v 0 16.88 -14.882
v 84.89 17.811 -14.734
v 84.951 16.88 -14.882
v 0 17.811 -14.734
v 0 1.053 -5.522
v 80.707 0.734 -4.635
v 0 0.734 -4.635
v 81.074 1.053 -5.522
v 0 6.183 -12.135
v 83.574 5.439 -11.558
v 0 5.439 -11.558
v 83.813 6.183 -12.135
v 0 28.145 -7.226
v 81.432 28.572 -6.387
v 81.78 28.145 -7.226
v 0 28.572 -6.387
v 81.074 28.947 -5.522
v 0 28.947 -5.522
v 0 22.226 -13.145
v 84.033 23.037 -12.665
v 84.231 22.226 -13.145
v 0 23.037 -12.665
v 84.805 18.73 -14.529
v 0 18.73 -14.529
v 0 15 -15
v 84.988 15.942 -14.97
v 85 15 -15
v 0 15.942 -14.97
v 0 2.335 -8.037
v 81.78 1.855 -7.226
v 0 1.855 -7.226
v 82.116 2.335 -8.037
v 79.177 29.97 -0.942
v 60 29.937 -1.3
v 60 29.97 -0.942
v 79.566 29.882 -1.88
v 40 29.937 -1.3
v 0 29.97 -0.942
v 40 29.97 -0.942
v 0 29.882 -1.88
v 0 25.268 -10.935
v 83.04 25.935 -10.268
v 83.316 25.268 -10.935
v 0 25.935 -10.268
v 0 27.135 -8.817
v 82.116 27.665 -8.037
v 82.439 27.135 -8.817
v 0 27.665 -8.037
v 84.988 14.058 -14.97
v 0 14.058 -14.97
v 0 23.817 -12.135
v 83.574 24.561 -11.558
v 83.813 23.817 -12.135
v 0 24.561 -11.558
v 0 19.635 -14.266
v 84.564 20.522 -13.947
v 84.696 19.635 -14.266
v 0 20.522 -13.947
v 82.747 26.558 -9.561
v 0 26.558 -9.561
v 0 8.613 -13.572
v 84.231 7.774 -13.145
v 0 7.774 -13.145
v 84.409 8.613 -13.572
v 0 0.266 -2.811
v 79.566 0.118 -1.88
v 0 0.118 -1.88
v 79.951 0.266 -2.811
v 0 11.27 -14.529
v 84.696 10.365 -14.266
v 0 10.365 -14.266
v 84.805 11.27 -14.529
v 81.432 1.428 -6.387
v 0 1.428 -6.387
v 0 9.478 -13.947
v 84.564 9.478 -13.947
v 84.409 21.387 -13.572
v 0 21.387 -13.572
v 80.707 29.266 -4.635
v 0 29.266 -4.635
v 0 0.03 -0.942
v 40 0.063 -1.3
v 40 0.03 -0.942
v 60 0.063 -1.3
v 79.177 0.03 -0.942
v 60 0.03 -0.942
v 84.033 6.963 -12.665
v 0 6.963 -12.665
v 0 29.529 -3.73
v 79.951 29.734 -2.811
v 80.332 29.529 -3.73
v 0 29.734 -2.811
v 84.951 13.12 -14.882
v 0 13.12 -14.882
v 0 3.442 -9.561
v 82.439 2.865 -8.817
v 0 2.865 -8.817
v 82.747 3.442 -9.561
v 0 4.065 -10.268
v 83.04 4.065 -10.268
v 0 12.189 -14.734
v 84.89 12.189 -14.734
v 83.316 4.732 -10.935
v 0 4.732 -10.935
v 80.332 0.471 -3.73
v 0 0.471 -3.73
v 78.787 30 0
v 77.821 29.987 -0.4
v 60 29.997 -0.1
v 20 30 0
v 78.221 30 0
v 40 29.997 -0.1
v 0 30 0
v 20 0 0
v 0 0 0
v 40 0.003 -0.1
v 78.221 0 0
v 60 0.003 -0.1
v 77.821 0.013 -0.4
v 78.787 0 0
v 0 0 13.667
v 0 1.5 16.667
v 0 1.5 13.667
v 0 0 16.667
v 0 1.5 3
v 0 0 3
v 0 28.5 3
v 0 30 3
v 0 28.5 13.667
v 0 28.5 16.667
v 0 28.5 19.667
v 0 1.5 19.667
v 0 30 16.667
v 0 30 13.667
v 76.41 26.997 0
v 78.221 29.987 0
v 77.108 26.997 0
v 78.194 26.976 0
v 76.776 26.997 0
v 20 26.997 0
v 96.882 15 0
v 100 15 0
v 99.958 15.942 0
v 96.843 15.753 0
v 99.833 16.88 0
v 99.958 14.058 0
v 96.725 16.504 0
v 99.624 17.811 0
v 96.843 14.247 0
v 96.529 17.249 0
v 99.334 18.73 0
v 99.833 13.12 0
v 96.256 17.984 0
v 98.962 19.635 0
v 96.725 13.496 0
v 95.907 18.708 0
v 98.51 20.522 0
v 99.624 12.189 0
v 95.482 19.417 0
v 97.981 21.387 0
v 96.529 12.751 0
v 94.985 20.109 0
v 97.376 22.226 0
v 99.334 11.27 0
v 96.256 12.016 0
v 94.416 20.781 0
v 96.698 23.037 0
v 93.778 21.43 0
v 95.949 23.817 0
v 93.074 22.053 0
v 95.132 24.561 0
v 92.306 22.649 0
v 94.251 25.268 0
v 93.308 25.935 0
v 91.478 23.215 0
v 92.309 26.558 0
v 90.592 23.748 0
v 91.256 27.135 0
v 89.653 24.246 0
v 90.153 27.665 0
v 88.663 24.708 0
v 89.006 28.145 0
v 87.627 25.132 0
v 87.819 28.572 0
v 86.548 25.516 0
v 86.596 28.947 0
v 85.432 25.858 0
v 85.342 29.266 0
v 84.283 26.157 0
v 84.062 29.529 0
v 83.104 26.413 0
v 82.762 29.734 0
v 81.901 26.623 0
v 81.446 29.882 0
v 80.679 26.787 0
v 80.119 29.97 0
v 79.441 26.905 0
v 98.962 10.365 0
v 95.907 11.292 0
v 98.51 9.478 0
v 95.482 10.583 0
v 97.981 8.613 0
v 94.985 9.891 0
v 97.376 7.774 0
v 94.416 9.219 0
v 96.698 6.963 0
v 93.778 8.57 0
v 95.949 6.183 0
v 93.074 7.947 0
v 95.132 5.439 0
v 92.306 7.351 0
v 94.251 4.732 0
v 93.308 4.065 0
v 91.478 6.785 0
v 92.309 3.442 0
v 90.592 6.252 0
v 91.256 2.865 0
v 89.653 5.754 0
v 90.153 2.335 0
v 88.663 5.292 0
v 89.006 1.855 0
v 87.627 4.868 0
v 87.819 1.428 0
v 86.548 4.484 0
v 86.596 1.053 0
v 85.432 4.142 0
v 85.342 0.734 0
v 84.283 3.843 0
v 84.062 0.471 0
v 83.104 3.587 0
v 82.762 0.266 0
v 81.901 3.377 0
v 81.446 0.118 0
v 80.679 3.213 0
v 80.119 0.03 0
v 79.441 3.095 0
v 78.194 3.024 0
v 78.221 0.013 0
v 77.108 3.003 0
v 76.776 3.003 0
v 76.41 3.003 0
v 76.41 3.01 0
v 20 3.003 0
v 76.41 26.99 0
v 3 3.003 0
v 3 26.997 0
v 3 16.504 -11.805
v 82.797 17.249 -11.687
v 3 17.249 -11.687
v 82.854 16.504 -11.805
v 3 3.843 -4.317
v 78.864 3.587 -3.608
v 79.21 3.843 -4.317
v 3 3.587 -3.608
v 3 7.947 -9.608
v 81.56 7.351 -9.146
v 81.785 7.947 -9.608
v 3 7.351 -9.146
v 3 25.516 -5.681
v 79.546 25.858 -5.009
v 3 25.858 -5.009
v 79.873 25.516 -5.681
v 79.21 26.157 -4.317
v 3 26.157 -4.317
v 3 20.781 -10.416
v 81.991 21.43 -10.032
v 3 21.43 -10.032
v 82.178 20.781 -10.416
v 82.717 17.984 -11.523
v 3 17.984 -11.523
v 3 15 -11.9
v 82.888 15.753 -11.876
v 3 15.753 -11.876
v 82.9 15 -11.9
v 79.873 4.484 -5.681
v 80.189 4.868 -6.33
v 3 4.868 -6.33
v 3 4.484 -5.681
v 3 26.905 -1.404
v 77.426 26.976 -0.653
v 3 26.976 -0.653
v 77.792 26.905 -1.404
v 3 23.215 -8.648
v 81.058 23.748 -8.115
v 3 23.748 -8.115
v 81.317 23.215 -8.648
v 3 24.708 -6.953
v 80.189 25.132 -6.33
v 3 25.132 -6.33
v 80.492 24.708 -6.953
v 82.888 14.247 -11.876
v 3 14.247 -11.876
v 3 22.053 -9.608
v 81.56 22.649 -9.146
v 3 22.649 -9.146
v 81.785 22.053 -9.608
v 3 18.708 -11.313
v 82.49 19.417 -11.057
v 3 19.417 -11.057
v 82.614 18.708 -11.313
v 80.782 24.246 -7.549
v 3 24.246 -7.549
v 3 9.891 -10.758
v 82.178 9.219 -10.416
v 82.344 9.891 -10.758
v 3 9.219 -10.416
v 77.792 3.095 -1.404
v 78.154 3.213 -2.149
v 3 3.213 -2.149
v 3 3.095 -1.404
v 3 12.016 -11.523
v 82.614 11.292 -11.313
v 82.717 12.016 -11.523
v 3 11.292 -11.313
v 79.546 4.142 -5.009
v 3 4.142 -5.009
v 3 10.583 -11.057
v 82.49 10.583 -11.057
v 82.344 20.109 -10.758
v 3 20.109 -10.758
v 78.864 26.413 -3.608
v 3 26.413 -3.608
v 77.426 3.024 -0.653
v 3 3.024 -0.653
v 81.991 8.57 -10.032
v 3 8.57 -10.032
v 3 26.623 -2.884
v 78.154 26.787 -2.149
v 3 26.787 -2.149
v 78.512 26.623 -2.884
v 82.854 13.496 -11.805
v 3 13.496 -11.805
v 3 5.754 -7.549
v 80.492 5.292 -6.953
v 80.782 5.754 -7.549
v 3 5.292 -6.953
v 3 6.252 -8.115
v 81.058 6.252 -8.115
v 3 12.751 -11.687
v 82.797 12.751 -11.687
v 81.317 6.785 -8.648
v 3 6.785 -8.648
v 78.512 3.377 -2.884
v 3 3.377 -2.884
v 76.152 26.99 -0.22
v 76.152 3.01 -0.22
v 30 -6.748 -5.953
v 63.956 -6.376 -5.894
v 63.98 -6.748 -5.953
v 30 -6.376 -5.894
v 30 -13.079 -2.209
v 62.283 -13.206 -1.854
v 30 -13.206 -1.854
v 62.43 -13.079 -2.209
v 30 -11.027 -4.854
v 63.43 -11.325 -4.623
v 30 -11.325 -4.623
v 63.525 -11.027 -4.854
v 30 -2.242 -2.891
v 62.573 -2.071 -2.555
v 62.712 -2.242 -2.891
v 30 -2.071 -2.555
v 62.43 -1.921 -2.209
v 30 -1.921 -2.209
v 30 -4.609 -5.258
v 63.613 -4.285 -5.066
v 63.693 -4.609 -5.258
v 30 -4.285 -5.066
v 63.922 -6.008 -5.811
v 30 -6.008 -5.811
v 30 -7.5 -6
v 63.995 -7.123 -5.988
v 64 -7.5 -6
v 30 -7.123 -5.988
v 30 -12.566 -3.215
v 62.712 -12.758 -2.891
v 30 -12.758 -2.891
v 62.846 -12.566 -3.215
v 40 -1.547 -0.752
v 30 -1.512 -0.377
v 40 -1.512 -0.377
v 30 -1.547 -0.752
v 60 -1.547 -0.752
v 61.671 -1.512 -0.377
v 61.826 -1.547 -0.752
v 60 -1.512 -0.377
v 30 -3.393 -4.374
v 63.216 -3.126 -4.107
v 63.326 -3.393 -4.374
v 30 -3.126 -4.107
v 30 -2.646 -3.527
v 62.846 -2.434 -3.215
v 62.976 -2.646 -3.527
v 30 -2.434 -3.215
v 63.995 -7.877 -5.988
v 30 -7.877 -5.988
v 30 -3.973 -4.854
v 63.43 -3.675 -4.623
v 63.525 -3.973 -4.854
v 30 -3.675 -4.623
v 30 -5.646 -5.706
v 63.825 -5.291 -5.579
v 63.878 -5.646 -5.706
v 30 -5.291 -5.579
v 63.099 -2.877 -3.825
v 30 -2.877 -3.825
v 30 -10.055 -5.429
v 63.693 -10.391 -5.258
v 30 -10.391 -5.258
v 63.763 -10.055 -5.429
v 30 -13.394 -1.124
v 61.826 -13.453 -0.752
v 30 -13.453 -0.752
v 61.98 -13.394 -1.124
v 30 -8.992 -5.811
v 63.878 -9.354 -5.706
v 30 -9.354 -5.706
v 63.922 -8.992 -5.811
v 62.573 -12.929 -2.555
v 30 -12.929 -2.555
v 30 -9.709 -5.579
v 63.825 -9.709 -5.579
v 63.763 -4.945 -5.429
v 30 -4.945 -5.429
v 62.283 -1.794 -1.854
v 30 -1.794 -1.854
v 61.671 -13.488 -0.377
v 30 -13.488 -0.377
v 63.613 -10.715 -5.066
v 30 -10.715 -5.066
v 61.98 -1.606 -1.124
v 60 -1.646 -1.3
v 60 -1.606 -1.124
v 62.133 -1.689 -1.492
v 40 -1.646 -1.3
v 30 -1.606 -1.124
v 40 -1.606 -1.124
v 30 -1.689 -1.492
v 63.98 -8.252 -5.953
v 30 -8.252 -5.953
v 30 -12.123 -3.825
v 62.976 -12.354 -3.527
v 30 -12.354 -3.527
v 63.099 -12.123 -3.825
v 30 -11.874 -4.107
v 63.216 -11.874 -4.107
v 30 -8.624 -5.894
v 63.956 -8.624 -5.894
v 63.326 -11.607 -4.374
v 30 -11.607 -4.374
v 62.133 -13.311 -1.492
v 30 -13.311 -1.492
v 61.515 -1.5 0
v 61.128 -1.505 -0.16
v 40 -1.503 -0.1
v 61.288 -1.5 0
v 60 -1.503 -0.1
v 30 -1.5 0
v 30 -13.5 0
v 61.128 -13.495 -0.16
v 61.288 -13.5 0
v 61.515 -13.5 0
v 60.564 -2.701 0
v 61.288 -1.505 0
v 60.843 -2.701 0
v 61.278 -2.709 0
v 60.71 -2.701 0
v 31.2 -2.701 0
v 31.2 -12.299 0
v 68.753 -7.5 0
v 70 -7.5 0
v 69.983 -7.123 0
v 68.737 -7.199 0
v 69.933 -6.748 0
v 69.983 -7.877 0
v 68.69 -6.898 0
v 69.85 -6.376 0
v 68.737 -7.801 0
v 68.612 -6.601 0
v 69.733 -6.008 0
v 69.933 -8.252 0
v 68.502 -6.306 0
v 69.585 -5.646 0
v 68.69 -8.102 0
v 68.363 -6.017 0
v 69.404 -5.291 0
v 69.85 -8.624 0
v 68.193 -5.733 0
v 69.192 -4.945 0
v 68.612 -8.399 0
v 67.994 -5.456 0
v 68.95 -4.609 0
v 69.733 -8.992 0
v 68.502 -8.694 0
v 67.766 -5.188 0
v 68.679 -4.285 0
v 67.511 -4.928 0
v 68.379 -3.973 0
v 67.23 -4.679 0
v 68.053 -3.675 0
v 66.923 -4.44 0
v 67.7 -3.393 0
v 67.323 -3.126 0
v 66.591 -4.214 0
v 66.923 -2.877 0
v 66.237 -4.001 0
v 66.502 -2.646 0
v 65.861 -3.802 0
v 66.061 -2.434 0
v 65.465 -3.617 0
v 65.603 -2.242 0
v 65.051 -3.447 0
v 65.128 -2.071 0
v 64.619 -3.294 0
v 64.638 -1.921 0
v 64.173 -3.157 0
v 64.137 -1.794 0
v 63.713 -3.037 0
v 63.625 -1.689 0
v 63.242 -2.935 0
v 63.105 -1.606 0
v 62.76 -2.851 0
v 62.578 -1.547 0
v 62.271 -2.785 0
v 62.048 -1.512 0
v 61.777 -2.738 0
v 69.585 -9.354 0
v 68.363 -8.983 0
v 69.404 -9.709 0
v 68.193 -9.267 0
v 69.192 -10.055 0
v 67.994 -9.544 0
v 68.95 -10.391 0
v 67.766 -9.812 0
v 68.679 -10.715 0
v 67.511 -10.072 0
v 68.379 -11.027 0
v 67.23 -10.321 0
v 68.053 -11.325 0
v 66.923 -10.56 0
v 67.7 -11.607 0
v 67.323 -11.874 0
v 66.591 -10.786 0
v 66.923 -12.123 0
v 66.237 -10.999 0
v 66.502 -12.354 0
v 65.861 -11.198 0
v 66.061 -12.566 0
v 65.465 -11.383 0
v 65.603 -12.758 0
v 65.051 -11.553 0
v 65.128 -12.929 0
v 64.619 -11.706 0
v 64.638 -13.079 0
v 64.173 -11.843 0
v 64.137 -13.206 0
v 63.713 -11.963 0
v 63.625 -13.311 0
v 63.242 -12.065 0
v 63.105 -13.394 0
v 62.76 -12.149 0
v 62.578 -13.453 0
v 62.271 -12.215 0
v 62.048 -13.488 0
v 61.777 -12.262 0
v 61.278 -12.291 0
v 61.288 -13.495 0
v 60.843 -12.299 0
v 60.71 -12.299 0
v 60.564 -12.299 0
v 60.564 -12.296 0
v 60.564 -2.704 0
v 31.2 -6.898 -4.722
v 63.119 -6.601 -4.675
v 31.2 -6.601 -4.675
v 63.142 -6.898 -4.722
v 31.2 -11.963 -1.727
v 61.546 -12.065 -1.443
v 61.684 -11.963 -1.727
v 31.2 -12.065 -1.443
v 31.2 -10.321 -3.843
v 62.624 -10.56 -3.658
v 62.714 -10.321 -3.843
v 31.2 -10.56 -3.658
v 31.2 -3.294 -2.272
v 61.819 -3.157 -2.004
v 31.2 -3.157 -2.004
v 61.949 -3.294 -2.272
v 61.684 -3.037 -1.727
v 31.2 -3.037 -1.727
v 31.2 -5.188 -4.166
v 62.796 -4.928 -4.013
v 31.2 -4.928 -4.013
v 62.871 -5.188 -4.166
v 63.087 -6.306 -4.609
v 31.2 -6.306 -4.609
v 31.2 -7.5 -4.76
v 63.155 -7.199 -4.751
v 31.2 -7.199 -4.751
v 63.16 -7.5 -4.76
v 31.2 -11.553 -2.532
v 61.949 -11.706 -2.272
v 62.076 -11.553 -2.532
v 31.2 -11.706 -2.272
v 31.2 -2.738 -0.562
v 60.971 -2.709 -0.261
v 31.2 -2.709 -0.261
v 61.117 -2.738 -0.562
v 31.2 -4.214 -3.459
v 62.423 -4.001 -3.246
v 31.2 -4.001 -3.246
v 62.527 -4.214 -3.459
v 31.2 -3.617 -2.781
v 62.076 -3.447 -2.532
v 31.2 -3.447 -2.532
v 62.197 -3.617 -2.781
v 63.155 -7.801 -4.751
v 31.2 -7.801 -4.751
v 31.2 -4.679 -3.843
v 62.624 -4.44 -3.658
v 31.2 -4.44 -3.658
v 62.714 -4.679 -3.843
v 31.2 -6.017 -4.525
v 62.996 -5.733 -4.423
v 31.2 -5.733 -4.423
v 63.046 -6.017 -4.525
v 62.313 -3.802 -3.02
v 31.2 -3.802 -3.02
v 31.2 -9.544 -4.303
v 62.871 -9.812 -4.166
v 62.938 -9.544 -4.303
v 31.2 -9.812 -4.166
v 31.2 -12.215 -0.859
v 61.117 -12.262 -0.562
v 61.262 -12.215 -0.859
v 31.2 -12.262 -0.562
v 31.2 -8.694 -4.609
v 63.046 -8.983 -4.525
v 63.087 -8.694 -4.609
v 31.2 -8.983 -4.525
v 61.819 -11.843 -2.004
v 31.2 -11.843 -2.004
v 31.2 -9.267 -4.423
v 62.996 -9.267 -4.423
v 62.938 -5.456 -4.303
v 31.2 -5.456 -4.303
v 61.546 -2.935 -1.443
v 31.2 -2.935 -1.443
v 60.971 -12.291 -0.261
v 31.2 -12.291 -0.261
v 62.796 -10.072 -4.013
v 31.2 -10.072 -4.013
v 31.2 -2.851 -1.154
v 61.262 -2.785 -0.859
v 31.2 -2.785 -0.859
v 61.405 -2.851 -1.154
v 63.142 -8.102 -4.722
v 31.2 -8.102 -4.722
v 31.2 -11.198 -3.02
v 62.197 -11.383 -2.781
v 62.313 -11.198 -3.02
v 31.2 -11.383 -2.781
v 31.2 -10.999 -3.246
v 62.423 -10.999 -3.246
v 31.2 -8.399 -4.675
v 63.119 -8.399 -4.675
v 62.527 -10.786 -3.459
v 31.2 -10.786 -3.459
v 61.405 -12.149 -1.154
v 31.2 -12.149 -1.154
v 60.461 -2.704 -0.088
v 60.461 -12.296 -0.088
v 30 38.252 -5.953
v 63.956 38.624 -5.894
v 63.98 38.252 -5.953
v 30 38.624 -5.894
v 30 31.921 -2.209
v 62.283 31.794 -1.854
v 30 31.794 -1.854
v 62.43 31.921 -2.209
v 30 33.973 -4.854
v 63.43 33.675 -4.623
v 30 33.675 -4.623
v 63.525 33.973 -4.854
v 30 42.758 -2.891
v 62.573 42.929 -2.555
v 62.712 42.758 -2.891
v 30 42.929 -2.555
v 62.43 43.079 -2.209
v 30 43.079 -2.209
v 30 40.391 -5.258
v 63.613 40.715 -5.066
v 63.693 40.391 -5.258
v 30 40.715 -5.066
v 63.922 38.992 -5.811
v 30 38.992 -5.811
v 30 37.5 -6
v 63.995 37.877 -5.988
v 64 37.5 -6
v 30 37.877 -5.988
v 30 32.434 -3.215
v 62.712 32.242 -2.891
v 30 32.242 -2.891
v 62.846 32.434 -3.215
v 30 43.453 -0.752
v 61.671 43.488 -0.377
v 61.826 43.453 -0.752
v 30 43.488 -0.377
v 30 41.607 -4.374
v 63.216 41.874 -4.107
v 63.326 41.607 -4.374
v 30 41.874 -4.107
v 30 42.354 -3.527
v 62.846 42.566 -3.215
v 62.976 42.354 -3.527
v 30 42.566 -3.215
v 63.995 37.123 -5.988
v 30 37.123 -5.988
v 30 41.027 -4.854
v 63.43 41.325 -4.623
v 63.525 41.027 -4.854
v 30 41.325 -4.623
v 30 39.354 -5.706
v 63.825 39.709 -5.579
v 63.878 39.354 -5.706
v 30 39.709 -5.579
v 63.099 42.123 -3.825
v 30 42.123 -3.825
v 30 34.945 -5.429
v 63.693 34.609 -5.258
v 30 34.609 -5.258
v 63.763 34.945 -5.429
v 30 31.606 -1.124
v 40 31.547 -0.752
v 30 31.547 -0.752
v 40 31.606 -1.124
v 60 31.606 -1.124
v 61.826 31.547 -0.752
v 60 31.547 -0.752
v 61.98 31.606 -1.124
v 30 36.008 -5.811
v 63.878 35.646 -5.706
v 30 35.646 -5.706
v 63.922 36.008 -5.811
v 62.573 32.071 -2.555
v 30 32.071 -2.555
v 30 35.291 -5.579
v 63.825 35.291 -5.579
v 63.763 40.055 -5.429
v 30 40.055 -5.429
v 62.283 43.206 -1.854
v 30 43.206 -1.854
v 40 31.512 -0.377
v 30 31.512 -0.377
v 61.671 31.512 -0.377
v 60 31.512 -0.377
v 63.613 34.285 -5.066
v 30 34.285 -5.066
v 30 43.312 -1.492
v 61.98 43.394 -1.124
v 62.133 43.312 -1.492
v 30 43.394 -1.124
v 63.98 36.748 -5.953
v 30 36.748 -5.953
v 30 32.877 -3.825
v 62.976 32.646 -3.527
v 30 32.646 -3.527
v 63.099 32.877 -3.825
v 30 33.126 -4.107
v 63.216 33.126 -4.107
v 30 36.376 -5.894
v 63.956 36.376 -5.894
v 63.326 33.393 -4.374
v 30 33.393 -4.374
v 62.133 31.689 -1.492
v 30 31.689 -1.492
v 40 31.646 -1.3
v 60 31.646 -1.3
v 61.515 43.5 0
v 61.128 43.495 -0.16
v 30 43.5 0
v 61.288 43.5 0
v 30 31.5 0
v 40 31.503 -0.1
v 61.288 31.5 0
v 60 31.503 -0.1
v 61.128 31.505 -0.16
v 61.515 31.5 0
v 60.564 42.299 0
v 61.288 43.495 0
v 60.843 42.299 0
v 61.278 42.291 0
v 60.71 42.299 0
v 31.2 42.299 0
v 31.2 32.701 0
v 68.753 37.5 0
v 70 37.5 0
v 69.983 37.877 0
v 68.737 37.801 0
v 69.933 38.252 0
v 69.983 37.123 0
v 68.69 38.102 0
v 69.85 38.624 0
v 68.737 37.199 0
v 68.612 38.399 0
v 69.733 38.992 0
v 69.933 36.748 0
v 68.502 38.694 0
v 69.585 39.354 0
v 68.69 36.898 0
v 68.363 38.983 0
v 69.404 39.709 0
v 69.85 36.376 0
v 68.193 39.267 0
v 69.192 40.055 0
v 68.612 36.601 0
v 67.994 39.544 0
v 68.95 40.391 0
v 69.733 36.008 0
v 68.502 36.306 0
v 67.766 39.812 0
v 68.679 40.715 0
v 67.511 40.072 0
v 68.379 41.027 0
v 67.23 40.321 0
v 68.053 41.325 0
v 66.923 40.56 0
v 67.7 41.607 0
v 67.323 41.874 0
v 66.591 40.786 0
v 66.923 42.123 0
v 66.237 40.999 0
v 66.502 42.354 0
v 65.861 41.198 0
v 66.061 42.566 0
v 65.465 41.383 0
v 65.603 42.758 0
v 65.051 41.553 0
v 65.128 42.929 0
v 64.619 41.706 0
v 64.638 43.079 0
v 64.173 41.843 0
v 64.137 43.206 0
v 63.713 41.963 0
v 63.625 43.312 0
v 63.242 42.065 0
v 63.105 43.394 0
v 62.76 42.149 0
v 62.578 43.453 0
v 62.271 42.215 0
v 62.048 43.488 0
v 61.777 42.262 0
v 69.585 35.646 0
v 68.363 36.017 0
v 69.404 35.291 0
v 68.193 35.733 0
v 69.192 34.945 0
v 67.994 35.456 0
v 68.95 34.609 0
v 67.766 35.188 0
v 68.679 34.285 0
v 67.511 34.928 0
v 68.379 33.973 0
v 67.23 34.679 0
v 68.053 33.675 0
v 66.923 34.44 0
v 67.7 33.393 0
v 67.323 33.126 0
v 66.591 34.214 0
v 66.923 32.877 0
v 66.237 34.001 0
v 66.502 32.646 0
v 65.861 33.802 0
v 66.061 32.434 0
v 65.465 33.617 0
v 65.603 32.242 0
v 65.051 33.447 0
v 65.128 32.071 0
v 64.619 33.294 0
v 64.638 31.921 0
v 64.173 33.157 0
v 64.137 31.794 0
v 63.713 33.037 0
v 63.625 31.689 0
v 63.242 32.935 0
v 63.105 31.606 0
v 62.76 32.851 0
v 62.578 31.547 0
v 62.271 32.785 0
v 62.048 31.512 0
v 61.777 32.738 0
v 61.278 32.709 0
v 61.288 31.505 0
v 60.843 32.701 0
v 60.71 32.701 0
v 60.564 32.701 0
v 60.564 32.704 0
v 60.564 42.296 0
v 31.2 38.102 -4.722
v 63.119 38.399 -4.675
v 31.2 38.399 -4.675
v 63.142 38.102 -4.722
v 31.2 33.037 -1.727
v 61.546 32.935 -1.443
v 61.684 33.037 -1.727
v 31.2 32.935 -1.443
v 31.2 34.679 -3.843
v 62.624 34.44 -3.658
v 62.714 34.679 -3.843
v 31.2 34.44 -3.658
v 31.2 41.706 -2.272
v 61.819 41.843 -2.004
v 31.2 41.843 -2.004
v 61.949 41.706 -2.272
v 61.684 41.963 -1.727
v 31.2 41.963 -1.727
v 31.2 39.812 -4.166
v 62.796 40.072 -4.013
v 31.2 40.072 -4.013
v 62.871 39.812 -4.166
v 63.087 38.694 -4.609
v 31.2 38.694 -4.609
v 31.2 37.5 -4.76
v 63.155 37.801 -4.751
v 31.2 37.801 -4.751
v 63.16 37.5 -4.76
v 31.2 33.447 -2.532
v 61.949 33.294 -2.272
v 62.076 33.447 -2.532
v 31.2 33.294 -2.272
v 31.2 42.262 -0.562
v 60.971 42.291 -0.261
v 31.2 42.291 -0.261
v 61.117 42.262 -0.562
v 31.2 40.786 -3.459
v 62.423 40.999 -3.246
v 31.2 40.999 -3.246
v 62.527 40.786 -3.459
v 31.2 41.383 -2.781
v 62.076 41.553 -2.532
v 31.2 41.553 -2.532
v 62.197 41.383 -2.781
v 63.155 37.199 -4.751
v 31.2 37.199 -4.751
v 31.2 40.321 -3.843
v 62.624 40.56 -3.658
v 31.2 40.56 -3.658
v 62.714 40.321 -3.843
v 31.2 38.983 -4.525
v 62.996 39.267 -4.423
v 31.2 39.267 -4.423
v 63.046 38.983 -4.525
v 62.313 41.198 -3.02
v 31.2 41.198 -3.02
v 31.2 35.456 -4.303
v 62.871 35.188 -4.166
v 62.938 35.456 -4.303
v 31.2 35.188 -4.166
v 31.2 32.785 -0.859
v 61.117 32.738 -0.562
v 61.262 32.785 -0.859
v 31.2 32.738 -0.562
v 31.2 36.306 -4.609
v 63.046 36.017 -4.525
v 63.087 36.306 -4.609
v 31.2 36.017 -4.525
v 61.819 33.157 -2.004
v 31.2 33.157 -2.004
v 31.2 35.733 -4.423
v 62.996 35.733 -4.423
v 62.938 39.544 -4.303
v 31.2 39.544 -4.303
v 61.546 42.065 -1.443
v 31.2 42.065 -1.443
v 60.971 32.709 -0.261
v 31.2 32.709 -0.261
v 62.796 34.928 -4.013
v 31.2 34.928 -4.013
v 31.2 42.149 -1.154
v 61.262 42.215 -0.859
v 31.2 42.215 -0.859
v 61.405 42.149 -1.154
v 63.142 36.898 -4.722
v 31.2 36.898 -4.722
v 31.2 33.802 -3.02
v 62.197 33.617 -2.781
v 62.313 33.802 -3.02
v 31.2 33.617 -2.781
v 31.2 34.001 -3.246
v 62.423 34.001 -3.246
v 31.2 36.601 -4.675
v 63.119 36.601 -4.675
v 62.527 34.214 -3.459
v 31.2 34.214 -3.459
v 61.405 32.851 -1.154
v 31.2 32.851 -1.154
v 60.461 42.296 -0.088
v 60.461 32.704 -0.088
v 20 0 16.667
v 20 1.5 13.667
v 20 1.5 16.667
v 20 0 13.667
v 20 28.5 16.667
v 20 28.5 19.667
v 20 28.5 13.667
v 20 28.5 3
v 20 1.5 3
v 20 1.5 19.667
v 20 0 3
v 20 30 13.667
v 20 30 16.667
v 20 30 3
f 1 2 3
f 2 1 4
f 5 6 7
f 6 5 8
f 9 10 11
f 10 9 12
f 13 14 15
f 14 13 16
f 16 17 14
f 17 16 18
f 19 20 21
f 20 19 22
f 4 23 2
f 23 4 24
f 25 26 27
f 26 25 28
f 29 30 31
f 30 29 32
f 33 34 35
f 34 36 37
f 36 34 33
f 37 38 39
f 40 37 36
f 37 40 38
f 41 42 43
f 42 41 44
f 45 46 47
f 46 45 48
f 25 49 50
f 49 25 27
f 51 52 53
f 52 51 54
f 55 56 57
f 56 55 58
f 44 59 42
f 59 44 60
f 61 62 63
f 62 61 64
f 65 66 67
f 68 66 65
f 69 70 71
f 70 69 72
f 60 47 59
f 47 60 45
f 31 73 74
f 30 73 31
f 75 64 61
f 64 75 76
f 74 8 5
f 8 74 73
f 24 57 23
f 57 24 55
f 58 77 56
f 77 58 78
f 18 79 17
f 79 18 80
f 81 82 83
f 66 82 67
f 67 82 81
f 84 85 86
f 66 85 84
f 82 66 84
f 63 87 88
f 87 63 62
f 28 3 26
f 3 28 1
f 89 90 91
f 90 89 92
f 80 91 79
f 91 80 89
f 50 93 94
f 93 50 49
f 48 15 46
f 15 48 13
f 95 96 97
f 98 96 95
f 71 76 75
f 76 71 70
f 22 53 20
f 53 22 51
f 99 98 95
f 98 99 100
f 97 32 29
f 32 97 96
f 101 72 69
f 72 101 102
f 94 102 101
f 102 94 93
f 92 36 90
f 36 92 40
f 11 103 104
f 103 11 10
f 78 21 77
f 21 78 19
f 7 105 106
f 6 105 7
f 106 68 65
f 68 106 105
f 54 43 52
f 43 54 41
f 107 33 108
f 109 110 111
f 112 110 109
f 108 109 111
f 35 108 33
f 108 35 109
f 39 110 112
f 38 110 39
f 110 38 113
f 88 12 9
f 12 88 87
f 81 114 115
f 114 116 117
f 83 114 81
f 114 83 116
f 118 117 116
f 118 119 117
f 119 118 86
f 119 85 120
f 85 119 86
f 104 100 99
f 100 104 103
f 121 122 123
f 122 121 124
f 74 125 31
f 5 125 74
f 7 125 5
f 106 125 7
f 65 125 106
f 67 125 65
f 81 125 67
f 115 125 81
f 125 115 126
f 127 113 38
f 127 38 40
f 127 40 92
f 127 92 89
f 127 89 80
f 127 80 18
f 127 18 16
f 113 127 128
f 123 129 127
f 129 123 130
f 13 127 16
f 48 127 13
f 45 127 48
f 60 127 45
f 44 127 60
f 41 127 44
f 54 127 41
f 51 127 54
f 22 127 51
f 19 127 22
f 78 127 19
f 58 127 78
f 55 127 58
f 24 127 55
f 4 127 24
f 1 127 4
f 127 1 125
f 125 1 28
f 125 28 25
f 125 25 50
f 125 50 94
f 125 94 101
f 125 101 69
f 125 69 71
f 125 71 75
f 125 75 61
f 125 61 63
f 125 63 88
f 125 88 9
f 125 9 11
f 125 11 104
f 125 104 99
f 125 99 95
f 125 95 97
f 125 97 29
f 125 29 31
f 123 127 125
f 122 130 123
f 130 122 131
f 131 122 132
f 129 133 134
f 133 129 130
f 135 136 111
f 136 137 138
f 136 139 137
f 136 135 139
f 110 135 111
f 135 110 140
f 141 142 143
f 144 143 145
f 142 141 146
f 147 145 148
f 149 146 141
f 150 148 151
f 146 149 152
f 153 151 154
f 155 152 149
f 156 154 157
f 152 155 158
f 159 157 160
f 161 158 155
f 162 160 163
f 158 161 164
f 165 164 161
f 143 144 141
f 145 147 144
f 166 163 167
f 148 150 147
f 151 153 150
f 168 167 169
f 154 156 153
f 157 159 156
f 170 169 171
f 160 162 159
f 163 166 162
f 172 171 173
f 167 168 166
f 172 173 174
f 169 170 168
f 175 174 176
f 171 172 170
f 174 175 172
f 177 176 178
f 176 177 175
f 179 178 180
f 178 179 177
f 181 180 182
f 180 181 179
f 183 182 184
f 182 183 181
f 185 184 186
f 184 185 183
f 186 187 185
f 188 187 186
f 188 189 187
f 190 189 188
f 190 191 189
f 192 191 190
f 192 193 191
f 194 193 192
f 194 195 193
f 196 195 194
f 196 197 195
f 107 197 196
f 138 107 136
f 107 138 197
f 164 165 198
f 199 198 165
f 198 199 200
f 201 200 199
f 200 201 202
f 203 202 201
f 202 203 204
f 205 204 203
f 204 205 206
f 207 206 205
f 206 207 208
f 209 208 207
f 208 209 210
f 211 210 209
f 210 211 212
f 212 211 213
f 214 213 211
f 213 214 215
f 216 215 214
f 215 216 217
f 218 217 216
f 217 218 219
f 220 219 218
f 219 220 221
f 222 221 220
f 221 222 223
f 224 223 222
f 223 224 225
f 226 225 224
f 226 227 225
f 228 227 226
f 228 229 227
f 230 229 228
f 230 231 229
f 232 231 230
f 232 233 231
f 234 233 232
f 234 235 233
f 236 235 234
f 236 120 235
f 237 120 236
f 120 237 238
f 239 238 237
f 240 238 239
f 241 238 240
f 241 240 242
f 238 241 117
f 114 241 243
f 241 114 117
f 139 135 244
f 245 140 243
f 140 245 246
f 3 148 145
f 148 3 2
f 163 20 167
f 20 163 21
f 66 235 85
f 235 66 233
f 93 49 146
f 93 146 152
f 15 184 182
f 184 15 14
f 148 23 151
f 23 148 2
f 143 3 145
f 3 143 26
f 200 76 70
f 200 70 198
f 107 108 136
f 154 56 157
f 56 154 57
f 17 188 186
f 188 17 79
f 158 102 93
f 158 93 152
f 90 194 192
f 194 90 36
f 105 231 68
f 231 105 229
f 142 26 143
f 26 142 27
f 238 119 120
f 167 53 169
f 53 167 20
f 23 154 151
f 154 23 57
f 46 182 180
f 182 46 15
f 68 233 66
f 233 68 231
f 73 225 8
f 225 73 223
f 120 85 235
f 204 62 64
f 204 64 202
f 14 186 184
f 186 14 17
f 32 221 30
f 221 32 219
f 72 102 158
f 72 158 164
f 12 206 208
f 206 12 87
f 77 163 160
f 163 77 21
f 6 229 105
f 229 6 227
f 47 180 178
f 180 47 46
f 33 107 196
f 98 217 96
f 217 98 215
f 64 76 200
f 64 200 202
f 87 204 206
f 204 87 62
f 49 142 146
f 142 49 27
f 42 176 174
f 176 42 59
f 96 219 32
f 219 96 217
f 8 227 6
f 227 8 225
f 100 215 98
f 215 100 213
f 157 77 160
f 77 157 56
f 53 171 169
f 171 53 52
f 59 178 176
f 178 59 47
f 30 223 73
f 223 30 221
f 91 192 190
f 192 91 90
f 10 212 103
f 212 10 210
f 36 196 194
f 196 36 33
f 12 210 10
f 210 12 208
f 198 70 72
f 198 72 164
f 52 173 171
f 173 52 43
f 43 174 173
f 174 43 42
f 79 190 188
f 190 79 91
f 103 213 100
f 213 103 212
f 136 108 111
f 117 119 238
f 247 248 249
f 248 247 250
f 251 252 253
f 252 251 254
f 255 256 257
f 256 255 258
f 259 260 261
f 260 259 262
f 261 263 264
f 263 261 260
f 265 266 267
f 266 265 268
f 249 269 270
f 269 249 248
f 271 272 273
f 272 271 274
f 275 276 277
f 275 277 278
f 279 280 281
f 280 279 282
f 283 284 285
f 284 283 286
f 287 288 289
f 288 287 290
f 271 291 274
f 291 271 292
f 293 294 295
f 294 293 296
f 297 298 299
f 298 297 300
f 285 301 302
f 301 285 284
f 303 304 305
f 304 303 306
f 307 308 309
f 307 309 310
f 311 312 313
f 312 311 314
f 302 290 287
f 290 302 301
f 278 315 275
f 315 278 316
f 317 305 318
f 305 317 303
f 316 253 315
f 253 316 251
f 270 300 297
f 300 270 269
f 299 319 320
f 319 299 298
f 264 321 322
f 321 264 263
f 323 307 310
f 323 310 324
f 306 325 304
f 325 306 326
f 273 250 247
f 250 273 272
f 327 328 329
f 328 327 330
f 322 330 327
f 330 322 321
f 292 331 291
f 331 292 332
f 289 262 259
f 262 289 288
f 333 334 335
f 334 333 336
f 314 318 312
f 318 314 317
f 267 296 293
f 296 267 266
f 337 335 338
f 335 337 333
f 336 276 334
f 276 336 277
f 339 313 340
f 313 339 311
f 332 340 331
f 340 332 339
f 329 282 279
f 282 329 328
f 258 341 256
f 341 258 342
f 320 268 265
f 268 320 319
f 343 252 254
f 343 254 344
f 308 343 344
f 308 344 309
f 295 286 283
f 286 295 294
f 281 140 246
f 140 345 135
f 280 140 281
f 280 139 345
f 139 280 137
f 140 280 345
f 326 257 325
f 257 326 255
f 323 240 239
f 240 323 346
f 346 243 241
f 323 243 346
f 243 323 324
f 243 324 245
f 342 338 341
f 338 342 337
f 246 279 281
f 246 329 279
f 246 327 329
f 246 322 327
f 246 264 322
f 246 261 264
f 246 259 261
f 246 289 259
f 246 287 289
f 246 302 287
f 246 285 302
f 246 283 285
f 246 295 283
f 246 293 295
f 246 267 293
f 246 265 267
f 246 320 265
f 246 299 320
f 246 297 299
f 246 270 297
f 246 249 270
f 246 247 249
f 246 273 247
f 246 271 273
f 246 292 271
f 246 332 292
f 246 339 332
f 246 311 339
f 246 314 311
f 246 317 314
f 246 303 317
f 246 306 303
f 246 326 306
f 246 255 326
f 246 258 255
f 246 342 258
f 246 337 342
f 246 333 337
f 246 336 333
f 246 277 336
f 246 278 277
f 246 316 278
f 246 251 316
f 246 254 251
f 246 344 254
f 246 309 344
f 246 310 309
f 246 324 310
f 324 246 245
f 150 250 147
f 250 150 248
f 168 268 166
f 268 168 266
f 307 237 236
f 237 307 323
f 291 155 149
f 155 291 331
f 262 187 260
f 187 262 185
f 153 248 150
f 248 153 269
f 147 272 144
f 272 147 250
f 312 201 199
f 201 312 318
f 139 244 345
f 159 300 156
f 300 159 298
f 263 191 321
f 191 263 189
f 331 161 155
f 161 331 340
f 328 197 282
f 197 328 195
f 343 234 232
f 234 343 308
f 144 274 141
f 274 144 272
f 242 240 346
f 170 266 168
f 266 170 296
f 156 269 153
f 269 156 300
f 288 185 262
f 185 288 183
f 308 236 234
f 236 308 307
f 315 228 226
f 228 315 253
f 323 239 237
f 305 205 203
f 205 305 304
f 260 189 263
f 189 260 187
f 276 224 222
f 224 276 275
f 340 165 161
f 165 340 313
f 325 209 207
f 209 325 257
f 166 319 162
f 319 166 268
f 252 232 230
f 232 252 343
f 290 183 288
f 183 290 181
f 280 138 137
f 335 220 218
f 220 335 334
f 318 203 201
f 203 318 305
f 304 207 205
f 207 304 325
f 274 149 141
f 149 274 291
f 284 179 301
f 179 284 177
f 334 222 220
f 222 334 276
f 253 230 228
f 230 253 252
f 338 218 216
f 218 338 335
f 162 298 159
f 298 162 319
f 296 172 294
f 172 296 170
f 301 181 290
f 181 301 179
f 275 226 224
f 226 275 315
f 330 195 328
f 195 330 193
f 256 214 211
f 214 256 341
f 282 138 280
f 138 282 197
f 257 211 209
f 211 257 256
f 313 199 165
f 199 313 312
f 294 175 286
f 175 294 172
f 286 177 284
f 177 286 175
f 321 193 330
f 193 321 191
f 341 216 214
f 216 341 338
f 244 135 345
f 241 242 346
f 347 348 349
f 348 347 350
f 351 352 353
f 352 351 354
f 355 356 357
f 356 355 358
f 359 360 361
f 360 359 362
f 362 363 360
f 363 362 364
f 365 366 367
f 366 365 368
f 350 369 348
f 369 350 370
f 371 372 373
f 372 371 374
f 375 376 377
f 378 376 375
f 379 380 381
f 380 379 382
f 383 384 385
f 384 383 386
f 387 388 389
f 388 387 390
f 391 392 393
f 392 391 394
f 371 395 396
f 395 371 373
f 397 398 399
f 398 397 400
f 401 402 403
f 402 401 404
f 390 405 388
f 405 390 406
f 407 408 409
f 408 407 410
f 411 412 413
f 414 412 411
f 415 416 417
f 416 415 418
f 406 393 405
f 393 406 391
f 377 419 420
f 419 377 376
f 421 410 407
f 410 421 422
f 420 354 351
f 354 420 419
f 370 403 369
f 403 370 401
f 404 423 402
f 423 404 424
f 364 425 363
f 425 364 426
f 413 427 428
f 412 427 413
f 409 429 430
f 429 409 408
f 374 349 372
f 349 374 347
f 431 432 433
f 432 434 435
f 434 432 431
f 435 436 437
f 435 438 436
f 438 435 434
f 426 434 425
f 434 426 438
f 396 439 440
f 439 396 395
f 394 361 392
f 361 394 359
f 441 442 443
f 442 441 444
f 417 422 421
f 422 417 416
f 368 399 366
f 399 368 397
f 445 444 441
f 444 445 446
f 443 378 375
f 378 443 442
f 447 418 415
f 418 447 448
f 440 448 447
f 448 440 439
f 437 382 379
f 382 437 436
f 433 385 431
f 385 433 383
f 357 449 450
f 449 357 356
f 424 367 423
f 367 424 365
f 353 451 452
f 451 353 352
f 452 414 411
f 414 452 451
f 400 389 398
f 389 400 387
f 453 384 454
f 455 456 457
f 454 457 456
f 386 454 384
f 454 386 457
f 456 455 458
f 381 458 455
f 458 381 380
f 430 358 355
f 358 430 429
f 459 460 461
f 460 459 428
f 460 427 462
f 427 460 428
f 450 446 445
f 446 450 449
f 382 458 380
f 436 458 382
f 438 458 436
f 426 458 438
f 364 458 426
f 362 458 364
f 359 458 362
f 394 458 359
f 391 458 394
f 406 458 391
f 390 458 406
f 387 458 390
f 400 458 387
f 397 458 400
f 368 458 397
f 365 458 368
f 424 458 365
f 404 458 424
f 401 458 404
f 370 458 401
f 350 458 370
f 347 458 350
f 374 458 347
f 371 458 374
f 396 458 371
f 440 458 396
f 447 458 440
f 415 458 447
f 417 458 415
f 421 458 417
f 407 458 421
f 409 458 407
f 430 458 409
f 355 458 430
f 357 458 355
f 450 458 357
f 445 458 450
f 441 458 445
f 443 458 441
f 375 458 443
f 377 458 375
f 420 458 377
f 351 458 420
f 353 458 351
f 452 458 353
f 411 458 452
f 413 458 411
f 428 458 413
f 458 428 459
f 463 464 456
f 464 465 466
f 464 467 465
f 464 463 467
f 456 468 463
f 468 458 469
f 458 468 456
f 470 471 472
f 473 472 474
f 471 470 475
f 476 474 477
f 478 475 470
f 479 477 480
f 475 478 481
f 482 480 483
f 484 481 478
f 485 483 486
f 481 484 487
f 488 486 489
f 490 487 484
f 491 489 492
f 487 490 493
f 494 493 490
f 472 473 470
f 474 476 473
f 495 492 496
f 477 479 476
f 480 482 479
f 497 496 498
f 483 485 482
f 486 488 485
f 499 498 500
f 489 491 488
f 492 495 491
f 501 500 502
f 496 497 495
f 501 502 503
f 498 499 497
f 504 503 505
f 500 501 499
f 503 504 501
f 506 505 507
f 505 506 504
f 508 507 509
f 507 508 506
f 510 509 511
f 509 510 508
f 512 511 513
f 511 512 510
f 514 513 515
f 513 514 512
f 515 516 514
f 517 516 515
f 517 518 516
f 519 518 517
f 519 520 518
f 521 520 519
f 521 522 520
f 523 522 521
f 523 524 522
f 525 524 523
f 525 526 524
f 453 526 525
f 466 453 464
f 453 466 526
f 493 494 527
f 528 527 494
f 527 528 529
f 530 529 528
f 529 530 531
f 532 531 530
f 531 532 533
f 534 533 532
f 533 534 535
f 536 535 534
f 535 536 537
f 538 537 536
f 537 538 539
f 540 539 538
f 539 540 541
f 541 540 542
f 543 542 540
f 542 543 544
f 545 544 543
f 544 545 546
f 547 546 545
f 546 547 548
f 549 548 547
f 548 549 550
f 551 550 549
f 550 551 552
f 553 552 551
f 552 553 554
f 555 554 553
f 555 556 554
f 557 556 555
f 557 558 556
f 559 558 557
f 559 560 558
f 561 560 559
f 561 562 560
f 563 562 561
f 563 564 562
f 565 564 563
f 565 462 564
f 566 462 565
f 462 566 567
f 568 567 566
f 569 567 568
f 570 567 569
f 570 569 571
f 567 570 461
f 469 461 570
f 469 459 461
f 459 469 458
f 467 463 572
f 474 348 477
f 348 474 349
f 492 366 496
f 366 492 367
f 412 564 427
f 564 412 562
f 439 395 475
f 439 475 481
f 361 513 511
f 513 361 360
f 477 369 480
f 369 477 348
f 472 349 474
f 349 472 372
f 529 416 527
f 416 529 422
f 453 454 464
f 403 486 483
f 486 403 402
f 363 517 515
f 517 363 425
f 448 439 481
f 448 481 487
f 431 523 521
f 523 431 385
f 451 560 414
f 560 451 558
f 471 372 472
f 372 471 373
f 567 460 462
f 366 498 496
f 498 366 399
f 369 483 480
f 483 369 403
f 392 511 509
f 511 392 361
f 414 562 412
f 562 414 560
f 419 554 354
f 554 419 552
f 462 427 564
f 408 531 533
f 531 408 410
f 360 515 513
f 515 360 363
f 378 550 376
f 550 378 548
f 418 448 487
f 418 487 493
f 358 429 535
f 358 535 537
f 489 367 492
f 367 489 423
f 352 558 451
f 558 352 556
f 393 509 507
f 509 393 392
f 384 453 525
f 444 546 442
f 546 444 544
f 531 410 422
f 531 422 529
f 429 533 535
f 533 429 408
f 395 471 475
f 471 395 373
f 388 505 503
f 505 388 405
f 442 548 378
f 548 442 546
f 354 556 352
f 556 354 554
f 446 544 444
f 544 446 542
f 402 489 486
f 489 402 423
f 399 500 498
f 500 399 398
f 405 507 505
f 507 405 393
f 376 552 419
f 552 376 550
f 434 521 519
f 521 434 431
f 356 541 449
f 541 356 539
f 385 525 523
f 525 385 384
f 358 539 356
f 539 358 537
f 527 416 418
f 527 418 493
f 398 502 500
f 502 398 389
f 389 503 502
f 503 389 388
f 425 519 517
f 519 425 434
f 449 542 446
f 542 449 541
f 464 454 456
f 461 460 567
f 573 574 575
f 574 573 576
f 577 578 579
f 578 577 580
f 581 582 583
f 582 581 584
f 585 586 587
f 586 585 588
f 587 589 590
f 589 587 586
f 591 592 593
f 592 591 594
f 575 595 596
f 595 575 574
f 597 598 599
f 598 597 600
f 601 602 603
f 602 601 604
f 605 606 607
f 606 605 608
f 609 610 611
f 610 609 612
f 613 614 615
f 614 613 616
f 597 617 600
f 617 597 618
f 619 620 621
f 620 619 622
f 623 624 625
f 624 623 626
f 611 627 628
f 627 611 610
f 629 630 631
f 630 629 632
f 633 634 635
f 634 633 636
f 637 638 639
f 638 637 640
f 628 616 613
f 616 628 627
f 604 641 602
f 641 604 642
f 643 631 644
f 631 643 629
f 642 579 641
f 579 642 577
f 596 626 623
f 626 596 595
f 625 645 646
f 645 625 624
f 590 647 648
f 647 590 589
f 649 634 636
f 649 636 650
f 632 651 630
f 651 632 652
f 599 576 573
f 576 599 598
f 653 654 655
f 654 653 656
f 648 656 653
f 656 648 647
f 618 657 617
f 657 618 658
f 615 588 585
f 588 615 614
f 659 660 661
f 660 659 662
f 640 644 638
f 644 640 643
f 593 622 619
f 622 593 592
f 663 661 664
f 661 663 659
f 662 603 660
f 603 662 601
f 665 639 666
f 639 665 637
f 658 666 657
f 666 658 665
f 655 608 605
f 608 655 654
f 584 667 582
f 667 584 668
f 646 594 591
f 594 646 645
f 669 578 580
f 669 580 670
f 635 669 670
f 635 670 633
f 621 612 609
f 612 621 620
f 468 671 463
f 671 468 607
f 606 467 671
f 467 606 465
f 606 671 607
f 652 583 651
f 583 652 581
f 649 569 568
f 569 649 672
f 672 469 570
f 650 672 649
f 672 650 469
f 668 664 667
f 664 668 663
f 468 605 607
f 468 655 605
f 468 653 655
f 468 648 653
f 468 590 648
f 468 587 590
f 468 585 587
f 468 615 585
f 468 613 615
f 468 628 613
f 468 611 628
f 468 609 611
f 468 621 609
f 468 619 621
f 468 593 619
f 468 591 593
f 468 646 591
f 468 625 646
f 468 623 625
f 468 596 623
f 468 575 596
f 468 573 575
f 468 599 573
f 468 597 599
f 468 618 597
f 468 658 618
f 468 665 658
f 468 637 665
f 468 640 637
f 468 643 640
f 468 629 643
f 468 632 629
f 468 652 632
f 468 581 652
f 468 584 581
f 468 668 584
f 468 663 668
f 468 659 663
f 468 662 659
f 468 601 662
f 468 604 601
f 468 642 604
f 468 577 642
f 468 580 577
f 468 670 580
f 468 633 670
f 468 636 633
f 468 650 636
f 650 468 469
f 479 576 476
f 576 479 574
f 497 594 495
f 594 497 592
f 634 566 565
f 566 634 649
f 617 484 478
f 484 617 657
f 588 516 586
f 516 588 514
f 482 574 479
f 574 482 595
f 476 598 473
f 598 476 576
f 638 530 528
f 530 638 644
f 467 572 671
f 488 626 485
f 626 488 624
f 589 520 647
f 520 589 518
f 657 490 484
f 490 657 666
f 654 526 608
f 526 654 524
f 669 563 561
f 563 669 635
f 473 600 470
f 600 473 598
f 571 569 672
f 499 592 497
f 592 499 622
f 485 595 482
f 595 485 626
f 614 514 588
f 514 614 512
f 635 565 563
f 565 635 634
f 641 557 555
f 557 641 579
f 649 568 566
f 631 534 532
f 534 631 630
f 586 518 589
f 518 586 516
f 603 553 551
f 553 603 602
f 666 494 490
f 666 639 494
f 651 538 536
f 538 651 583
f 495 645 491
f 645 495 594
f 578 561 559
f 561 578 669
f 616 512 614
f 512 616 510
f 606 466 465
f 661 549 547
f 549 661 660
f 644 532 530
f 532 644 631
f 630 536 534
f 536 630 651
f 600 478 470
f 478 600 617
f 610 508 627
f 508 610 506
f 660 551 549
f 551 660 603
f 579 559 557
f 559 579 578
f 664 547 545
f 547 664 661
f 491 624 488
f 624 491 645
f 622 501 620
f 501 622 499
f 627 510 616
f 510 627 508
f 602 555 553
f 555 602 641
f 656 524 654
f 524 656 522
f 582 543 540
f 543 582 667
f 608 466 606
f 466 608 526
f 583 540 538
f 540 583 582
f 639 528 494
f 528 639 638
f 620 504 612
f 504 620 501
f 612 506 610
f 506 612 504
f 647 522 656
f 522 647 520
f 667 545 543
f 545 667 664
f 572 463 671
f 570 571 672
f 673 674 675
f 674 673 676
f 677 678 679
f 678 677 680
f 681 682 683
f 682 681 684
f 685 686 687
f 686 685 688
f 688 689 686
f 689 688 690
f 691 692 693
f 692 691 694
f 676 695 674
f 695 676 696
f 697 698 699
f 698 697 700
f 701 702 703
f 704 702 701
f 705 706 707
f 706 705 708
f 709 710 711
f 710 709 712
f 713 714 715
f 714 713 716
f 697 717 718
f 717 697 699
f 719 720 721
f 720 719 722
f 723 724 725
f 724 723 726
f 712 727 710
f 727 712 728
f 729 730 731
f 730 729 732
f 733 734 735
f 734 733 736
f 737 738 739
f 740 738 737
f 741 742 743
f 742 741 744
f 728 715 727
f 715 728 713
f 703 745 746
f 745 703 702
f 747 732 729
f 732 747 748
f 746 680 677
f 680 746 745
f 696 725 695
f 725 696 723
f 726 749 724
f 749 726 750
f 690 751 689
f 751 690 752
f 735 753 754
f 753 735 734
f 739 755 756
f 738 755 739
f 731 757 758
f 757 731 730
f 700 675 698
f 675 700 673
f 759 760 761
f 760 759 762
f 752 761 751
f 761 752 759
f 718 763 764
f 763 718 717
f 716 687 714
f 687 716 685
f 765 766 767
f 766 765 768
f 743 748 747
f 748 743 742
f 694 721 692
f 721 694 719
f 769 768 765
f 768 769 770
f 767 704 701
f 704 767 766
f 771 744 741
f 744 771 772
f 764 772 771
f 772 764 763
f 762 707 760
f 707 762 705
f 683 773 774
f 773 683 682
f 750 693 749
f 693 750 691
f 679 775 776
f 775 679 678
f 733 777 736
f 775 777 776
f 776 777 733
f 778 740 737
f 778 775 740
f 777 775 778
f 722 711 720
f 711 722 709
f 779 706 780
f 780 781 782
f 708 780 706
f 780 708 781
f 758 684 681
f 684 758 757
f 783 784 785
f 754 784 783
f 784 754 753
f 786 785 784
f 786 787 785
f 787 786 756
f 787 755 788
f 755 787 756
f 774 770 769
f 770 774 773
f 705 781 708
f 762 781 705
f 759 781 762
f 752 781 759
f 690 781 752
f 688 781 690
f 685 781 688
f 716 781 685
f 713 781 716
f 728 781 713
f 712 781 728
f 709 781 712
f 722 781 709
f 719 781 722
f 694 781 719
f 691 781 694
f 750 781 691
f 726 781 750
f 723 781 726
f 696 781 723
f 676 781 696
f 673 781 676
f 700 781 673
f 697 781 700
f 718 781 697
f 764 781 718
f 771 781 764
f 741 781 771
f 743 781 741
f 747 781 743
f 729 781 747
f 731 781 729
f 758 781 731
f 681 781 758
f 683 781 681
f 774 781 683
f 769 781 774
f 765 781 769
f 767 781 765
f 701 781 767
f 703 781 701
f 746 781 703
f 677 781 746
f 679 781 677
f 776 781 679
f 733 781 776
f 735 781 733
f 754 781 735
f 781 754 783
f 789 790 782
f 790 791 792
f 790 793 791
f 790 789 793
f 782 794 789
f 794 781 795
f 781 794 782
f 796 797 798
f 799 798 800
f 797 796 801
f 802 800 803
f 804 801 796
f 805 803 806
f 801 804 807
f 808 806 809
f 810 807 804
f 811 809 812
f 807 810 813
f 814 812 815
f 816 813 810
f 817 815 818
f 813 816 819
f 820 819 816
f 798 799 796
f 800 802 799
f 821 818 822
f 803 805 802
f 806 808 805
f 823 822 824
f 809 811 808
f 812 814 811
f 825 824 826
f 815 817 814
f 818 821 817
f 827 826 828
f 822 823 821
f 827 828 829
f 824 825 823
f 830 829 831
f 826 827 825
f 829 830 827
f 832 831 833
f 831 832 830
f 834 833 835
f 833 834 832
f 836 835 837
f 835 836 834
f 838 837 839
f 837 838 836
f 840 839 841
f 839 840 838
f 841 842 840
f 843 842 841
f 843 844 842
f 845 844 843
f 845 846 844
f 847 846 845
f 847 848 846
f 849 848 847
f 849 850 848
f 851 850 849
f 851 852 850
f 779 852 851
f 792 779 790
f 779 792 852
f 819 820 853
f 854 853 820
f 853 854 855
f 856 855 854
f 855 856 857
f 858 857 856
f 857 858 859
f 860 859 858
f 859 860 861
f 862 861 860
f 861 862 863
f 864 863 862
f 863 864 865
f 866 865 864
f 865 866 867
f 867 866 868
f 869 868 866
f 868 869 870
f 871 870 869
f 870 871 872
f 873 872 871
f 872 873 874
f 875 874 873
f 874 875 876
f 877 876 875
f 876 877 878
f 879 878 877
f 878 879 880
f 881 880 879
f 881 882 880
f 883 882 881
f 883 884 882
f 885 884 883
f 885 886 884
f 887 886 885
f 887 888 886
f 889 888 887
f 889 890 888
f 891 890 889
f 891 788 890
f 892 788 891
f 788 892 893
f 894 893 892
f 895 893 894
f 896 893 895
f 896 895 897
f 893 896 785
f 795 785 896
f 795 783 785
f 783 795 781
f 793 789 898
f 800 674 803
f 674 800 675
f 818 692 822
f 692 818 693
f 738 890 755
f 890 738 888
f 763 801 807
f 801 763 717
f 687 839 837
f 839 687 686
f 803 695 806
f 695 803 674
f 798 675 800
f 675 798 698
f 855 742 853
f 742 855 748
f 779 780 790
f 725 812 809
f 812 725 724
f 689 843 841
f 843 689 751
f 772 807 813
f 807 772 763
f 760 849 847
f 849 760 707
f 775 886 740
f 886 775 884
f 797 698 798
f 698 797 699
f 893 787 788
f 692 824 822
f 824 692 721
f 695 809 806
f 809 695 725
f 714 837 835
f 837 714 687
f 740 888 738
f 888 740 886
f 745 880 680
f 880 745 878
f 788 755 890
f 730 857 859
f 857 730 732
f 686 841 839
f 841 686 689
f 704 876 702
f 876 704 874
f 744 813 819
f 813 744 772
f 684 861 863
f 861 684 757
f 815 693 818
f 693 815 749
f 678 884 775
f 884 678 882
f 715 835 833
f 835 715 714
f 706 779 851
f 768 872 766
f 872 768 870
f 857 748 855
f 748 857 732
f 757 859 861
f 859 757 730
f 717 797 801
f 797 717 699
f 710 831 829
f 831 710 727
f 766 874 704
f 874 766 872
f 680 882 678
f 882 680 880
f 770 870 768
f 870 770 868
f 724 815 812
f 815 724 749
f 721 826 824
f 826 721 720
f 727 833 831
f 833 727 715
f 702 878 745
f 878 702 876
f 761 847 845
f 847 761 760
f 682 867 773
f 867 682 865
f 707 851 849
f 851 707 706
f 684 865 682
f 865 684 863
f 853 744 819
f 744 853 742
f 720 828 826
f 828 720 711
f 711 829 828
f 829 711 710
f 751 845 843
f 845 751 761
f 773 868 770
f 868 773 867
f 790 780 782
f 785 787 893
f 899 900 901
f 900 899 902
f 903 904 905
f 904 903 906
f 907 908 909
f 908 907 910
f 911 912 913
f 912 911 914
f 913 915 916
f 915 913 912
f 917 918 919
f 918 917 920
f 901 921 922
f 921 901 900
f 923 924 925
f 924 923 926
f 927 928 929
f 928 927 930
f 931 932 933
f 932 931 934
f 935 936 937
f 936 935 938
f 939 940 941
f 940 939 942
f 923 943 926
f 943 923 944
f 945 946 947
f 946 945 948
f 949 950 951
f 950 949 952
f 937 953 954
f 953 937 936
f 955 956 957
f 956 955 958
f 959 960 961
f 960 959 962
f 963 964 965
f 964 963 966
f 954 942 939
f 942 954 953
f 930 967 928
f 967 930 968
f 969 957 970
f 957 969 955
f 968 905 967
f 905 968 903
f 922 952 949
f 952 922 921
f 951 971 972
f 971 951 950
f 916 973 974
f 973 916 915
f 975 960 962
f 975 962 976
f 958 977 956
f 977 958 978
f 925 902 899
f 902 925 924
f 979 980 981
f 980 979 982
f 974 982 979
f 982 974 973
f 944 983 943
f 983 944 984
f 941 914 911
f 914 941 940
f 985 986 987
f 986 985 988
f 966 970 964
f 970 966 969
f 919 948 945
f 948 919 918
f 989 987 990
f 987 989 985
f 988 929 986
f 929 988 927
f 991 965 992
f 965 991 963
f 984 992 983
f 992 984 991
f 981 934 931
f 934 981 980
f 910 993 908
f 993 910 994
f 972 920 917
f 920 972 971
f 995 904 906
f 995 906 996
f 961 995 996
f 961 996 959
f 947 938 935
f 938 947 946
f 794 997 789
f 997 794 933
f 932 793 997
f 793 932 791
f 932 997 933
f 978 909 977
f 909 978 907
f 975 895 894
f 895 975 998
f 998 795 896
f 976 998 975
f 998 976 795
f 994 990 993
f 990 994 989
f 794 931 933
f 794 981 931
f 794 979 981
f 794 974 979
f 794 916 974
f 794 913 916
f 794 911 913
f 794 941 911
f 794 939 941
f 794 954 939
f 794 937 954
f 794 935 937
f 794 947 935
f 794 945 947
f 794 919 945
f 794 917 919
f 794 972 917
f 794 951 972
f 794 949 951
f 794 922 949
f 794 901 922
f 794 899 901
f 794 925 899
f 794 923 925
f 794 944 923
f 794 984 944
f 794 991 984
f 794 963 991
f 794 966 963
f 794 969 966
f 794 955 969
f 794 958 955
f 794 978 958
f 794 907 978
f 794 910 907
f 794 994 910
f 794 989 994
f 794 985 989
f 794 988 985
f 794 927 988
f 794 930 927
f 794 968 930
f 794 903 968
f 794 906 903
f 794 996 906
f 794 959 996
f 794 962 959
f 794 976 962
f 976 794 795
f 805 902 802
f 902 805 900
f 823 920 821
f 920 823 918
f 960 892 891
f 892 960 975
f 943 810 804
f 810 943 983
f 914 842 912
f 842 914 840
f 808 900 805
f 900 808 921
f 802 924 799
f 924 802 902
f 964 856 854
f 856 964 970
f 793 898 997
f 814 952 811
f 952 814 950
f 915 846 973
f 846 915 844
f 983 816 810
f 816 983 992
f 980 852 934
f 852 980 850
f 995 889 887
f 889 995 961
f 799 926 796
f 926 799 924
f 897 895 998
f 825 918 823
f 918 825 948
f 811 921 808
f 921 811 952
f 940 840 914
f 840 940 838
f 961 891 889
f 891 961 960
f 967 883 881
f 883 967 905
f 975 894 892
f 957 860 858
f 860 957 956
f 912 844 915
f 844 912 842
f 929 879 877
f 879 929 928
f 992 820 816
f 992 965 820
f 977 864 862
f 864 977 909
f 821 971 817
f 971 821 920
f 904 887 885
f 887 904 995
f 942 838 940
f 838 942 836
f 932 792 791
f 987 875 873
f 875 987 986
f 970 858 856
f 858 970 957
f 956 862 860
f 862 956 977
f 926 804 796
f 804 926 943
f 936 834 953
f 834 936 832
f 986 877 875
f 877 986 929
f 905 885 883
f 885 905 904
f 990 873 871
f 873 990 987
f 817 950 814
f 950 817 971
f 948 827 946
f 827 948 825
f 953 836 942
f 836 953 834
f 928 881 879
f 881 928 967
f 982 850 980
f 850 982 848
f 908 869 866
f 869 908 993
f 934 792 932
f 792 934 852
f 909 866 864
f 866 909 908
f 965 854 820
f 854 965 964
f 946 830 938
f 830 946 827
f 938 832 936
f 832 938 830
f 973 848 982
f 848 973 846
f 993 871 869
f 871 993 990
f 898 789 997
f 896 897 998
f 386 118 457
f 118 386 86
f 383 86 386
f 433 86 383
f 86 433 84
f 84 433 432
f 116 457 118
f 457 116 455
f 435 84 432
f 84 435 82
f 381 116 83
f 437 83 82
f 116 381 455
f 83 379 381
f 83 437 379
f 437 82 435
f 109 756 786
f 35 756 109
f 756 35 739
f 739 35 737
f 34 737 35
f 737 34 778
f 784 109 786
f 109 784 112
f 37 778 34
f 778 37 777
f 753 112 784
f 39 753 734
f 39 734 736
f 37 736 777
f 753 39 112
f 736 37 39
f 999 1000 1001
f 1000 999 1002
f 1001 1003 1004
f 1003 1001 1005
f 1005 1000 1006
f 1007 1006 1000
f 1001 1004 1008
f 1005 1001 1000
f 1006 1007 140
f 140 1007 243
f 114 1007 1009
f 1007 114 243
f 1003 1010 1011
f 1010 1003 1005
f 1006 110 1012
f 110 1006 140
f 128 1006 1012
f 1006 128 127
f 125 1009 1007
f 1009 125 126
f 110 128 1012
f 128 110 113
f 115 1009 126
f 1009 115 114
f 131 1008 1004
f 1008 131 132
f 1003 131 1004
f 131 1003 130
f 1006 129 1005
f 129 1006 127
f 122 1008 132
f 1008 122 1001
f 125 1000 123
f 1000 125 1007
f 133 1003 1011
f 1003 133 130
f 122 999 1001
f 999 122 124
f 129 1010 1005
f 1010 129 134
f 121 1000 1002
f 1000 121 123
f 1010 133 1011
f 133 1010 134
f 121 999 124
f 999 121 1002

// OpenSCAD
length=100;
width=30;
front_angle=45;//[0:89]
wall=3;
jolly_boat_scale=0.4; //[0:0.01:0.49]
Cargo_Ship_Addon="Yes"; //[Yes, No]

/* [Hidden] */
fn=100;
eps=0.1;

complete_boat();
jolly_boat();
if (Cargo_Ship_Addon=="Yes")
{
    cargo();
}

module jolly_boat()
{
    //starboard
    translate([length/2,-width/4,0])
    scale(jolly_boat_scale)
    translate([-length/2,-width/2,0])
        complete_boat();
    
    //larboard
    translate([length/2,width+width/4,0])
    scale(jolly_boat_scale)
    translate([-length/2,-width/2,0])
        complete_boat();
    if (jolly_boat_scale<0.5)
    {
    //Bridge starboard
    translate([length/2-(length/2*jolly_boat_scale)/2,-width/4+width/2*jolly_boat_scale-jolly_boat_scale*wall+wall*jolly_boat_scale/2,-wall*jolly_boat_scale-eps])
    cube([length/2*jolly_boat_scale,width/4+jolly_boat_scale*(wall-width/2),wall*jolly_boat_scale]);
    
    //Brdige larboard
    translate([length/2-(length/2*jolly_boat_scale)/2,width-wall*jolly_boat_scale/2,-wall*jolly_boat_scale-eps])
    cube([length/2*jolly_boat_scale,width/4+jolly_boat_scale*(wall-width/2),wall*jolly_boat_scale]);
    }
}

module cargo()
{
cube([length/5,width,wall]);
translate([0,width/2-width*9/10/2,wall])
    cube([length/5,width*9/10,length/6]);
translate([0,0,length/6-wall])
cube([length/5,width,wall]);
}

module complete_boat()
{
difference()
{
boat();
 translate([wall,wall,eps])
    scale([(length-2*wall)/length,(width-2*wall)/width,(width/2-wall)/(width/2)])
boat();
}
}


module boat()
{
    difference()
{
    difference()
{
    rotate([0,90,0])
    translate([0,width/2,0])
    cylinder(h=length,r=width/2,center=false,$fn=fn);
    translate([-eps,-eps,0])
    cube([length+2*eps,width+2*eps,width/2],center=false);
}

difference()
{
translate([length-(sqrt(pow(width/2,2)+pow(width/2*tan(front_angle),2))+(width/2)/tan(front_angle))-eps,0,-width/2-eps])
cube([sqrt(pow(width/2,2)+pow(width/2*tan(front_angle),2))+(width/2)/tan(front_angle)+2*eps,width+2*eps,width/2+2*eps],center=false);
translate([length,width/2,0])
rotate([0,front_angle,0])
translate([-width/2,0,-(width/2*tan(front_angle)+sqrt(pow(width/2,2)+pow((width/2)/tan(front_angle),2)))-2*eps])
    {
cylinder(h=width/2*tan(front_angle)+sqrt(pow(width/2,2)+pow((width/2)/tan(front_angle),2))+4*eps,r=width/2,$fn=fn);
translate([-(width/2*tan(front_angle)+sqrt(pow(width/2,2)+pow((width/2)/tan(front_angle),2)))-2*eps,-width/2-eps,])
cube([(width/2*tan(front_angle)+sqrt(pow(width/2,2)+pow((width/2)/tan(front_angle),2)))-2*eps,width+4*eps,width/2*tan(front_angle)+sqrt(pow(width/2,2)+pow((width/2)/tan(front_angle),2))+4*eps]);
    }
}
}
}
